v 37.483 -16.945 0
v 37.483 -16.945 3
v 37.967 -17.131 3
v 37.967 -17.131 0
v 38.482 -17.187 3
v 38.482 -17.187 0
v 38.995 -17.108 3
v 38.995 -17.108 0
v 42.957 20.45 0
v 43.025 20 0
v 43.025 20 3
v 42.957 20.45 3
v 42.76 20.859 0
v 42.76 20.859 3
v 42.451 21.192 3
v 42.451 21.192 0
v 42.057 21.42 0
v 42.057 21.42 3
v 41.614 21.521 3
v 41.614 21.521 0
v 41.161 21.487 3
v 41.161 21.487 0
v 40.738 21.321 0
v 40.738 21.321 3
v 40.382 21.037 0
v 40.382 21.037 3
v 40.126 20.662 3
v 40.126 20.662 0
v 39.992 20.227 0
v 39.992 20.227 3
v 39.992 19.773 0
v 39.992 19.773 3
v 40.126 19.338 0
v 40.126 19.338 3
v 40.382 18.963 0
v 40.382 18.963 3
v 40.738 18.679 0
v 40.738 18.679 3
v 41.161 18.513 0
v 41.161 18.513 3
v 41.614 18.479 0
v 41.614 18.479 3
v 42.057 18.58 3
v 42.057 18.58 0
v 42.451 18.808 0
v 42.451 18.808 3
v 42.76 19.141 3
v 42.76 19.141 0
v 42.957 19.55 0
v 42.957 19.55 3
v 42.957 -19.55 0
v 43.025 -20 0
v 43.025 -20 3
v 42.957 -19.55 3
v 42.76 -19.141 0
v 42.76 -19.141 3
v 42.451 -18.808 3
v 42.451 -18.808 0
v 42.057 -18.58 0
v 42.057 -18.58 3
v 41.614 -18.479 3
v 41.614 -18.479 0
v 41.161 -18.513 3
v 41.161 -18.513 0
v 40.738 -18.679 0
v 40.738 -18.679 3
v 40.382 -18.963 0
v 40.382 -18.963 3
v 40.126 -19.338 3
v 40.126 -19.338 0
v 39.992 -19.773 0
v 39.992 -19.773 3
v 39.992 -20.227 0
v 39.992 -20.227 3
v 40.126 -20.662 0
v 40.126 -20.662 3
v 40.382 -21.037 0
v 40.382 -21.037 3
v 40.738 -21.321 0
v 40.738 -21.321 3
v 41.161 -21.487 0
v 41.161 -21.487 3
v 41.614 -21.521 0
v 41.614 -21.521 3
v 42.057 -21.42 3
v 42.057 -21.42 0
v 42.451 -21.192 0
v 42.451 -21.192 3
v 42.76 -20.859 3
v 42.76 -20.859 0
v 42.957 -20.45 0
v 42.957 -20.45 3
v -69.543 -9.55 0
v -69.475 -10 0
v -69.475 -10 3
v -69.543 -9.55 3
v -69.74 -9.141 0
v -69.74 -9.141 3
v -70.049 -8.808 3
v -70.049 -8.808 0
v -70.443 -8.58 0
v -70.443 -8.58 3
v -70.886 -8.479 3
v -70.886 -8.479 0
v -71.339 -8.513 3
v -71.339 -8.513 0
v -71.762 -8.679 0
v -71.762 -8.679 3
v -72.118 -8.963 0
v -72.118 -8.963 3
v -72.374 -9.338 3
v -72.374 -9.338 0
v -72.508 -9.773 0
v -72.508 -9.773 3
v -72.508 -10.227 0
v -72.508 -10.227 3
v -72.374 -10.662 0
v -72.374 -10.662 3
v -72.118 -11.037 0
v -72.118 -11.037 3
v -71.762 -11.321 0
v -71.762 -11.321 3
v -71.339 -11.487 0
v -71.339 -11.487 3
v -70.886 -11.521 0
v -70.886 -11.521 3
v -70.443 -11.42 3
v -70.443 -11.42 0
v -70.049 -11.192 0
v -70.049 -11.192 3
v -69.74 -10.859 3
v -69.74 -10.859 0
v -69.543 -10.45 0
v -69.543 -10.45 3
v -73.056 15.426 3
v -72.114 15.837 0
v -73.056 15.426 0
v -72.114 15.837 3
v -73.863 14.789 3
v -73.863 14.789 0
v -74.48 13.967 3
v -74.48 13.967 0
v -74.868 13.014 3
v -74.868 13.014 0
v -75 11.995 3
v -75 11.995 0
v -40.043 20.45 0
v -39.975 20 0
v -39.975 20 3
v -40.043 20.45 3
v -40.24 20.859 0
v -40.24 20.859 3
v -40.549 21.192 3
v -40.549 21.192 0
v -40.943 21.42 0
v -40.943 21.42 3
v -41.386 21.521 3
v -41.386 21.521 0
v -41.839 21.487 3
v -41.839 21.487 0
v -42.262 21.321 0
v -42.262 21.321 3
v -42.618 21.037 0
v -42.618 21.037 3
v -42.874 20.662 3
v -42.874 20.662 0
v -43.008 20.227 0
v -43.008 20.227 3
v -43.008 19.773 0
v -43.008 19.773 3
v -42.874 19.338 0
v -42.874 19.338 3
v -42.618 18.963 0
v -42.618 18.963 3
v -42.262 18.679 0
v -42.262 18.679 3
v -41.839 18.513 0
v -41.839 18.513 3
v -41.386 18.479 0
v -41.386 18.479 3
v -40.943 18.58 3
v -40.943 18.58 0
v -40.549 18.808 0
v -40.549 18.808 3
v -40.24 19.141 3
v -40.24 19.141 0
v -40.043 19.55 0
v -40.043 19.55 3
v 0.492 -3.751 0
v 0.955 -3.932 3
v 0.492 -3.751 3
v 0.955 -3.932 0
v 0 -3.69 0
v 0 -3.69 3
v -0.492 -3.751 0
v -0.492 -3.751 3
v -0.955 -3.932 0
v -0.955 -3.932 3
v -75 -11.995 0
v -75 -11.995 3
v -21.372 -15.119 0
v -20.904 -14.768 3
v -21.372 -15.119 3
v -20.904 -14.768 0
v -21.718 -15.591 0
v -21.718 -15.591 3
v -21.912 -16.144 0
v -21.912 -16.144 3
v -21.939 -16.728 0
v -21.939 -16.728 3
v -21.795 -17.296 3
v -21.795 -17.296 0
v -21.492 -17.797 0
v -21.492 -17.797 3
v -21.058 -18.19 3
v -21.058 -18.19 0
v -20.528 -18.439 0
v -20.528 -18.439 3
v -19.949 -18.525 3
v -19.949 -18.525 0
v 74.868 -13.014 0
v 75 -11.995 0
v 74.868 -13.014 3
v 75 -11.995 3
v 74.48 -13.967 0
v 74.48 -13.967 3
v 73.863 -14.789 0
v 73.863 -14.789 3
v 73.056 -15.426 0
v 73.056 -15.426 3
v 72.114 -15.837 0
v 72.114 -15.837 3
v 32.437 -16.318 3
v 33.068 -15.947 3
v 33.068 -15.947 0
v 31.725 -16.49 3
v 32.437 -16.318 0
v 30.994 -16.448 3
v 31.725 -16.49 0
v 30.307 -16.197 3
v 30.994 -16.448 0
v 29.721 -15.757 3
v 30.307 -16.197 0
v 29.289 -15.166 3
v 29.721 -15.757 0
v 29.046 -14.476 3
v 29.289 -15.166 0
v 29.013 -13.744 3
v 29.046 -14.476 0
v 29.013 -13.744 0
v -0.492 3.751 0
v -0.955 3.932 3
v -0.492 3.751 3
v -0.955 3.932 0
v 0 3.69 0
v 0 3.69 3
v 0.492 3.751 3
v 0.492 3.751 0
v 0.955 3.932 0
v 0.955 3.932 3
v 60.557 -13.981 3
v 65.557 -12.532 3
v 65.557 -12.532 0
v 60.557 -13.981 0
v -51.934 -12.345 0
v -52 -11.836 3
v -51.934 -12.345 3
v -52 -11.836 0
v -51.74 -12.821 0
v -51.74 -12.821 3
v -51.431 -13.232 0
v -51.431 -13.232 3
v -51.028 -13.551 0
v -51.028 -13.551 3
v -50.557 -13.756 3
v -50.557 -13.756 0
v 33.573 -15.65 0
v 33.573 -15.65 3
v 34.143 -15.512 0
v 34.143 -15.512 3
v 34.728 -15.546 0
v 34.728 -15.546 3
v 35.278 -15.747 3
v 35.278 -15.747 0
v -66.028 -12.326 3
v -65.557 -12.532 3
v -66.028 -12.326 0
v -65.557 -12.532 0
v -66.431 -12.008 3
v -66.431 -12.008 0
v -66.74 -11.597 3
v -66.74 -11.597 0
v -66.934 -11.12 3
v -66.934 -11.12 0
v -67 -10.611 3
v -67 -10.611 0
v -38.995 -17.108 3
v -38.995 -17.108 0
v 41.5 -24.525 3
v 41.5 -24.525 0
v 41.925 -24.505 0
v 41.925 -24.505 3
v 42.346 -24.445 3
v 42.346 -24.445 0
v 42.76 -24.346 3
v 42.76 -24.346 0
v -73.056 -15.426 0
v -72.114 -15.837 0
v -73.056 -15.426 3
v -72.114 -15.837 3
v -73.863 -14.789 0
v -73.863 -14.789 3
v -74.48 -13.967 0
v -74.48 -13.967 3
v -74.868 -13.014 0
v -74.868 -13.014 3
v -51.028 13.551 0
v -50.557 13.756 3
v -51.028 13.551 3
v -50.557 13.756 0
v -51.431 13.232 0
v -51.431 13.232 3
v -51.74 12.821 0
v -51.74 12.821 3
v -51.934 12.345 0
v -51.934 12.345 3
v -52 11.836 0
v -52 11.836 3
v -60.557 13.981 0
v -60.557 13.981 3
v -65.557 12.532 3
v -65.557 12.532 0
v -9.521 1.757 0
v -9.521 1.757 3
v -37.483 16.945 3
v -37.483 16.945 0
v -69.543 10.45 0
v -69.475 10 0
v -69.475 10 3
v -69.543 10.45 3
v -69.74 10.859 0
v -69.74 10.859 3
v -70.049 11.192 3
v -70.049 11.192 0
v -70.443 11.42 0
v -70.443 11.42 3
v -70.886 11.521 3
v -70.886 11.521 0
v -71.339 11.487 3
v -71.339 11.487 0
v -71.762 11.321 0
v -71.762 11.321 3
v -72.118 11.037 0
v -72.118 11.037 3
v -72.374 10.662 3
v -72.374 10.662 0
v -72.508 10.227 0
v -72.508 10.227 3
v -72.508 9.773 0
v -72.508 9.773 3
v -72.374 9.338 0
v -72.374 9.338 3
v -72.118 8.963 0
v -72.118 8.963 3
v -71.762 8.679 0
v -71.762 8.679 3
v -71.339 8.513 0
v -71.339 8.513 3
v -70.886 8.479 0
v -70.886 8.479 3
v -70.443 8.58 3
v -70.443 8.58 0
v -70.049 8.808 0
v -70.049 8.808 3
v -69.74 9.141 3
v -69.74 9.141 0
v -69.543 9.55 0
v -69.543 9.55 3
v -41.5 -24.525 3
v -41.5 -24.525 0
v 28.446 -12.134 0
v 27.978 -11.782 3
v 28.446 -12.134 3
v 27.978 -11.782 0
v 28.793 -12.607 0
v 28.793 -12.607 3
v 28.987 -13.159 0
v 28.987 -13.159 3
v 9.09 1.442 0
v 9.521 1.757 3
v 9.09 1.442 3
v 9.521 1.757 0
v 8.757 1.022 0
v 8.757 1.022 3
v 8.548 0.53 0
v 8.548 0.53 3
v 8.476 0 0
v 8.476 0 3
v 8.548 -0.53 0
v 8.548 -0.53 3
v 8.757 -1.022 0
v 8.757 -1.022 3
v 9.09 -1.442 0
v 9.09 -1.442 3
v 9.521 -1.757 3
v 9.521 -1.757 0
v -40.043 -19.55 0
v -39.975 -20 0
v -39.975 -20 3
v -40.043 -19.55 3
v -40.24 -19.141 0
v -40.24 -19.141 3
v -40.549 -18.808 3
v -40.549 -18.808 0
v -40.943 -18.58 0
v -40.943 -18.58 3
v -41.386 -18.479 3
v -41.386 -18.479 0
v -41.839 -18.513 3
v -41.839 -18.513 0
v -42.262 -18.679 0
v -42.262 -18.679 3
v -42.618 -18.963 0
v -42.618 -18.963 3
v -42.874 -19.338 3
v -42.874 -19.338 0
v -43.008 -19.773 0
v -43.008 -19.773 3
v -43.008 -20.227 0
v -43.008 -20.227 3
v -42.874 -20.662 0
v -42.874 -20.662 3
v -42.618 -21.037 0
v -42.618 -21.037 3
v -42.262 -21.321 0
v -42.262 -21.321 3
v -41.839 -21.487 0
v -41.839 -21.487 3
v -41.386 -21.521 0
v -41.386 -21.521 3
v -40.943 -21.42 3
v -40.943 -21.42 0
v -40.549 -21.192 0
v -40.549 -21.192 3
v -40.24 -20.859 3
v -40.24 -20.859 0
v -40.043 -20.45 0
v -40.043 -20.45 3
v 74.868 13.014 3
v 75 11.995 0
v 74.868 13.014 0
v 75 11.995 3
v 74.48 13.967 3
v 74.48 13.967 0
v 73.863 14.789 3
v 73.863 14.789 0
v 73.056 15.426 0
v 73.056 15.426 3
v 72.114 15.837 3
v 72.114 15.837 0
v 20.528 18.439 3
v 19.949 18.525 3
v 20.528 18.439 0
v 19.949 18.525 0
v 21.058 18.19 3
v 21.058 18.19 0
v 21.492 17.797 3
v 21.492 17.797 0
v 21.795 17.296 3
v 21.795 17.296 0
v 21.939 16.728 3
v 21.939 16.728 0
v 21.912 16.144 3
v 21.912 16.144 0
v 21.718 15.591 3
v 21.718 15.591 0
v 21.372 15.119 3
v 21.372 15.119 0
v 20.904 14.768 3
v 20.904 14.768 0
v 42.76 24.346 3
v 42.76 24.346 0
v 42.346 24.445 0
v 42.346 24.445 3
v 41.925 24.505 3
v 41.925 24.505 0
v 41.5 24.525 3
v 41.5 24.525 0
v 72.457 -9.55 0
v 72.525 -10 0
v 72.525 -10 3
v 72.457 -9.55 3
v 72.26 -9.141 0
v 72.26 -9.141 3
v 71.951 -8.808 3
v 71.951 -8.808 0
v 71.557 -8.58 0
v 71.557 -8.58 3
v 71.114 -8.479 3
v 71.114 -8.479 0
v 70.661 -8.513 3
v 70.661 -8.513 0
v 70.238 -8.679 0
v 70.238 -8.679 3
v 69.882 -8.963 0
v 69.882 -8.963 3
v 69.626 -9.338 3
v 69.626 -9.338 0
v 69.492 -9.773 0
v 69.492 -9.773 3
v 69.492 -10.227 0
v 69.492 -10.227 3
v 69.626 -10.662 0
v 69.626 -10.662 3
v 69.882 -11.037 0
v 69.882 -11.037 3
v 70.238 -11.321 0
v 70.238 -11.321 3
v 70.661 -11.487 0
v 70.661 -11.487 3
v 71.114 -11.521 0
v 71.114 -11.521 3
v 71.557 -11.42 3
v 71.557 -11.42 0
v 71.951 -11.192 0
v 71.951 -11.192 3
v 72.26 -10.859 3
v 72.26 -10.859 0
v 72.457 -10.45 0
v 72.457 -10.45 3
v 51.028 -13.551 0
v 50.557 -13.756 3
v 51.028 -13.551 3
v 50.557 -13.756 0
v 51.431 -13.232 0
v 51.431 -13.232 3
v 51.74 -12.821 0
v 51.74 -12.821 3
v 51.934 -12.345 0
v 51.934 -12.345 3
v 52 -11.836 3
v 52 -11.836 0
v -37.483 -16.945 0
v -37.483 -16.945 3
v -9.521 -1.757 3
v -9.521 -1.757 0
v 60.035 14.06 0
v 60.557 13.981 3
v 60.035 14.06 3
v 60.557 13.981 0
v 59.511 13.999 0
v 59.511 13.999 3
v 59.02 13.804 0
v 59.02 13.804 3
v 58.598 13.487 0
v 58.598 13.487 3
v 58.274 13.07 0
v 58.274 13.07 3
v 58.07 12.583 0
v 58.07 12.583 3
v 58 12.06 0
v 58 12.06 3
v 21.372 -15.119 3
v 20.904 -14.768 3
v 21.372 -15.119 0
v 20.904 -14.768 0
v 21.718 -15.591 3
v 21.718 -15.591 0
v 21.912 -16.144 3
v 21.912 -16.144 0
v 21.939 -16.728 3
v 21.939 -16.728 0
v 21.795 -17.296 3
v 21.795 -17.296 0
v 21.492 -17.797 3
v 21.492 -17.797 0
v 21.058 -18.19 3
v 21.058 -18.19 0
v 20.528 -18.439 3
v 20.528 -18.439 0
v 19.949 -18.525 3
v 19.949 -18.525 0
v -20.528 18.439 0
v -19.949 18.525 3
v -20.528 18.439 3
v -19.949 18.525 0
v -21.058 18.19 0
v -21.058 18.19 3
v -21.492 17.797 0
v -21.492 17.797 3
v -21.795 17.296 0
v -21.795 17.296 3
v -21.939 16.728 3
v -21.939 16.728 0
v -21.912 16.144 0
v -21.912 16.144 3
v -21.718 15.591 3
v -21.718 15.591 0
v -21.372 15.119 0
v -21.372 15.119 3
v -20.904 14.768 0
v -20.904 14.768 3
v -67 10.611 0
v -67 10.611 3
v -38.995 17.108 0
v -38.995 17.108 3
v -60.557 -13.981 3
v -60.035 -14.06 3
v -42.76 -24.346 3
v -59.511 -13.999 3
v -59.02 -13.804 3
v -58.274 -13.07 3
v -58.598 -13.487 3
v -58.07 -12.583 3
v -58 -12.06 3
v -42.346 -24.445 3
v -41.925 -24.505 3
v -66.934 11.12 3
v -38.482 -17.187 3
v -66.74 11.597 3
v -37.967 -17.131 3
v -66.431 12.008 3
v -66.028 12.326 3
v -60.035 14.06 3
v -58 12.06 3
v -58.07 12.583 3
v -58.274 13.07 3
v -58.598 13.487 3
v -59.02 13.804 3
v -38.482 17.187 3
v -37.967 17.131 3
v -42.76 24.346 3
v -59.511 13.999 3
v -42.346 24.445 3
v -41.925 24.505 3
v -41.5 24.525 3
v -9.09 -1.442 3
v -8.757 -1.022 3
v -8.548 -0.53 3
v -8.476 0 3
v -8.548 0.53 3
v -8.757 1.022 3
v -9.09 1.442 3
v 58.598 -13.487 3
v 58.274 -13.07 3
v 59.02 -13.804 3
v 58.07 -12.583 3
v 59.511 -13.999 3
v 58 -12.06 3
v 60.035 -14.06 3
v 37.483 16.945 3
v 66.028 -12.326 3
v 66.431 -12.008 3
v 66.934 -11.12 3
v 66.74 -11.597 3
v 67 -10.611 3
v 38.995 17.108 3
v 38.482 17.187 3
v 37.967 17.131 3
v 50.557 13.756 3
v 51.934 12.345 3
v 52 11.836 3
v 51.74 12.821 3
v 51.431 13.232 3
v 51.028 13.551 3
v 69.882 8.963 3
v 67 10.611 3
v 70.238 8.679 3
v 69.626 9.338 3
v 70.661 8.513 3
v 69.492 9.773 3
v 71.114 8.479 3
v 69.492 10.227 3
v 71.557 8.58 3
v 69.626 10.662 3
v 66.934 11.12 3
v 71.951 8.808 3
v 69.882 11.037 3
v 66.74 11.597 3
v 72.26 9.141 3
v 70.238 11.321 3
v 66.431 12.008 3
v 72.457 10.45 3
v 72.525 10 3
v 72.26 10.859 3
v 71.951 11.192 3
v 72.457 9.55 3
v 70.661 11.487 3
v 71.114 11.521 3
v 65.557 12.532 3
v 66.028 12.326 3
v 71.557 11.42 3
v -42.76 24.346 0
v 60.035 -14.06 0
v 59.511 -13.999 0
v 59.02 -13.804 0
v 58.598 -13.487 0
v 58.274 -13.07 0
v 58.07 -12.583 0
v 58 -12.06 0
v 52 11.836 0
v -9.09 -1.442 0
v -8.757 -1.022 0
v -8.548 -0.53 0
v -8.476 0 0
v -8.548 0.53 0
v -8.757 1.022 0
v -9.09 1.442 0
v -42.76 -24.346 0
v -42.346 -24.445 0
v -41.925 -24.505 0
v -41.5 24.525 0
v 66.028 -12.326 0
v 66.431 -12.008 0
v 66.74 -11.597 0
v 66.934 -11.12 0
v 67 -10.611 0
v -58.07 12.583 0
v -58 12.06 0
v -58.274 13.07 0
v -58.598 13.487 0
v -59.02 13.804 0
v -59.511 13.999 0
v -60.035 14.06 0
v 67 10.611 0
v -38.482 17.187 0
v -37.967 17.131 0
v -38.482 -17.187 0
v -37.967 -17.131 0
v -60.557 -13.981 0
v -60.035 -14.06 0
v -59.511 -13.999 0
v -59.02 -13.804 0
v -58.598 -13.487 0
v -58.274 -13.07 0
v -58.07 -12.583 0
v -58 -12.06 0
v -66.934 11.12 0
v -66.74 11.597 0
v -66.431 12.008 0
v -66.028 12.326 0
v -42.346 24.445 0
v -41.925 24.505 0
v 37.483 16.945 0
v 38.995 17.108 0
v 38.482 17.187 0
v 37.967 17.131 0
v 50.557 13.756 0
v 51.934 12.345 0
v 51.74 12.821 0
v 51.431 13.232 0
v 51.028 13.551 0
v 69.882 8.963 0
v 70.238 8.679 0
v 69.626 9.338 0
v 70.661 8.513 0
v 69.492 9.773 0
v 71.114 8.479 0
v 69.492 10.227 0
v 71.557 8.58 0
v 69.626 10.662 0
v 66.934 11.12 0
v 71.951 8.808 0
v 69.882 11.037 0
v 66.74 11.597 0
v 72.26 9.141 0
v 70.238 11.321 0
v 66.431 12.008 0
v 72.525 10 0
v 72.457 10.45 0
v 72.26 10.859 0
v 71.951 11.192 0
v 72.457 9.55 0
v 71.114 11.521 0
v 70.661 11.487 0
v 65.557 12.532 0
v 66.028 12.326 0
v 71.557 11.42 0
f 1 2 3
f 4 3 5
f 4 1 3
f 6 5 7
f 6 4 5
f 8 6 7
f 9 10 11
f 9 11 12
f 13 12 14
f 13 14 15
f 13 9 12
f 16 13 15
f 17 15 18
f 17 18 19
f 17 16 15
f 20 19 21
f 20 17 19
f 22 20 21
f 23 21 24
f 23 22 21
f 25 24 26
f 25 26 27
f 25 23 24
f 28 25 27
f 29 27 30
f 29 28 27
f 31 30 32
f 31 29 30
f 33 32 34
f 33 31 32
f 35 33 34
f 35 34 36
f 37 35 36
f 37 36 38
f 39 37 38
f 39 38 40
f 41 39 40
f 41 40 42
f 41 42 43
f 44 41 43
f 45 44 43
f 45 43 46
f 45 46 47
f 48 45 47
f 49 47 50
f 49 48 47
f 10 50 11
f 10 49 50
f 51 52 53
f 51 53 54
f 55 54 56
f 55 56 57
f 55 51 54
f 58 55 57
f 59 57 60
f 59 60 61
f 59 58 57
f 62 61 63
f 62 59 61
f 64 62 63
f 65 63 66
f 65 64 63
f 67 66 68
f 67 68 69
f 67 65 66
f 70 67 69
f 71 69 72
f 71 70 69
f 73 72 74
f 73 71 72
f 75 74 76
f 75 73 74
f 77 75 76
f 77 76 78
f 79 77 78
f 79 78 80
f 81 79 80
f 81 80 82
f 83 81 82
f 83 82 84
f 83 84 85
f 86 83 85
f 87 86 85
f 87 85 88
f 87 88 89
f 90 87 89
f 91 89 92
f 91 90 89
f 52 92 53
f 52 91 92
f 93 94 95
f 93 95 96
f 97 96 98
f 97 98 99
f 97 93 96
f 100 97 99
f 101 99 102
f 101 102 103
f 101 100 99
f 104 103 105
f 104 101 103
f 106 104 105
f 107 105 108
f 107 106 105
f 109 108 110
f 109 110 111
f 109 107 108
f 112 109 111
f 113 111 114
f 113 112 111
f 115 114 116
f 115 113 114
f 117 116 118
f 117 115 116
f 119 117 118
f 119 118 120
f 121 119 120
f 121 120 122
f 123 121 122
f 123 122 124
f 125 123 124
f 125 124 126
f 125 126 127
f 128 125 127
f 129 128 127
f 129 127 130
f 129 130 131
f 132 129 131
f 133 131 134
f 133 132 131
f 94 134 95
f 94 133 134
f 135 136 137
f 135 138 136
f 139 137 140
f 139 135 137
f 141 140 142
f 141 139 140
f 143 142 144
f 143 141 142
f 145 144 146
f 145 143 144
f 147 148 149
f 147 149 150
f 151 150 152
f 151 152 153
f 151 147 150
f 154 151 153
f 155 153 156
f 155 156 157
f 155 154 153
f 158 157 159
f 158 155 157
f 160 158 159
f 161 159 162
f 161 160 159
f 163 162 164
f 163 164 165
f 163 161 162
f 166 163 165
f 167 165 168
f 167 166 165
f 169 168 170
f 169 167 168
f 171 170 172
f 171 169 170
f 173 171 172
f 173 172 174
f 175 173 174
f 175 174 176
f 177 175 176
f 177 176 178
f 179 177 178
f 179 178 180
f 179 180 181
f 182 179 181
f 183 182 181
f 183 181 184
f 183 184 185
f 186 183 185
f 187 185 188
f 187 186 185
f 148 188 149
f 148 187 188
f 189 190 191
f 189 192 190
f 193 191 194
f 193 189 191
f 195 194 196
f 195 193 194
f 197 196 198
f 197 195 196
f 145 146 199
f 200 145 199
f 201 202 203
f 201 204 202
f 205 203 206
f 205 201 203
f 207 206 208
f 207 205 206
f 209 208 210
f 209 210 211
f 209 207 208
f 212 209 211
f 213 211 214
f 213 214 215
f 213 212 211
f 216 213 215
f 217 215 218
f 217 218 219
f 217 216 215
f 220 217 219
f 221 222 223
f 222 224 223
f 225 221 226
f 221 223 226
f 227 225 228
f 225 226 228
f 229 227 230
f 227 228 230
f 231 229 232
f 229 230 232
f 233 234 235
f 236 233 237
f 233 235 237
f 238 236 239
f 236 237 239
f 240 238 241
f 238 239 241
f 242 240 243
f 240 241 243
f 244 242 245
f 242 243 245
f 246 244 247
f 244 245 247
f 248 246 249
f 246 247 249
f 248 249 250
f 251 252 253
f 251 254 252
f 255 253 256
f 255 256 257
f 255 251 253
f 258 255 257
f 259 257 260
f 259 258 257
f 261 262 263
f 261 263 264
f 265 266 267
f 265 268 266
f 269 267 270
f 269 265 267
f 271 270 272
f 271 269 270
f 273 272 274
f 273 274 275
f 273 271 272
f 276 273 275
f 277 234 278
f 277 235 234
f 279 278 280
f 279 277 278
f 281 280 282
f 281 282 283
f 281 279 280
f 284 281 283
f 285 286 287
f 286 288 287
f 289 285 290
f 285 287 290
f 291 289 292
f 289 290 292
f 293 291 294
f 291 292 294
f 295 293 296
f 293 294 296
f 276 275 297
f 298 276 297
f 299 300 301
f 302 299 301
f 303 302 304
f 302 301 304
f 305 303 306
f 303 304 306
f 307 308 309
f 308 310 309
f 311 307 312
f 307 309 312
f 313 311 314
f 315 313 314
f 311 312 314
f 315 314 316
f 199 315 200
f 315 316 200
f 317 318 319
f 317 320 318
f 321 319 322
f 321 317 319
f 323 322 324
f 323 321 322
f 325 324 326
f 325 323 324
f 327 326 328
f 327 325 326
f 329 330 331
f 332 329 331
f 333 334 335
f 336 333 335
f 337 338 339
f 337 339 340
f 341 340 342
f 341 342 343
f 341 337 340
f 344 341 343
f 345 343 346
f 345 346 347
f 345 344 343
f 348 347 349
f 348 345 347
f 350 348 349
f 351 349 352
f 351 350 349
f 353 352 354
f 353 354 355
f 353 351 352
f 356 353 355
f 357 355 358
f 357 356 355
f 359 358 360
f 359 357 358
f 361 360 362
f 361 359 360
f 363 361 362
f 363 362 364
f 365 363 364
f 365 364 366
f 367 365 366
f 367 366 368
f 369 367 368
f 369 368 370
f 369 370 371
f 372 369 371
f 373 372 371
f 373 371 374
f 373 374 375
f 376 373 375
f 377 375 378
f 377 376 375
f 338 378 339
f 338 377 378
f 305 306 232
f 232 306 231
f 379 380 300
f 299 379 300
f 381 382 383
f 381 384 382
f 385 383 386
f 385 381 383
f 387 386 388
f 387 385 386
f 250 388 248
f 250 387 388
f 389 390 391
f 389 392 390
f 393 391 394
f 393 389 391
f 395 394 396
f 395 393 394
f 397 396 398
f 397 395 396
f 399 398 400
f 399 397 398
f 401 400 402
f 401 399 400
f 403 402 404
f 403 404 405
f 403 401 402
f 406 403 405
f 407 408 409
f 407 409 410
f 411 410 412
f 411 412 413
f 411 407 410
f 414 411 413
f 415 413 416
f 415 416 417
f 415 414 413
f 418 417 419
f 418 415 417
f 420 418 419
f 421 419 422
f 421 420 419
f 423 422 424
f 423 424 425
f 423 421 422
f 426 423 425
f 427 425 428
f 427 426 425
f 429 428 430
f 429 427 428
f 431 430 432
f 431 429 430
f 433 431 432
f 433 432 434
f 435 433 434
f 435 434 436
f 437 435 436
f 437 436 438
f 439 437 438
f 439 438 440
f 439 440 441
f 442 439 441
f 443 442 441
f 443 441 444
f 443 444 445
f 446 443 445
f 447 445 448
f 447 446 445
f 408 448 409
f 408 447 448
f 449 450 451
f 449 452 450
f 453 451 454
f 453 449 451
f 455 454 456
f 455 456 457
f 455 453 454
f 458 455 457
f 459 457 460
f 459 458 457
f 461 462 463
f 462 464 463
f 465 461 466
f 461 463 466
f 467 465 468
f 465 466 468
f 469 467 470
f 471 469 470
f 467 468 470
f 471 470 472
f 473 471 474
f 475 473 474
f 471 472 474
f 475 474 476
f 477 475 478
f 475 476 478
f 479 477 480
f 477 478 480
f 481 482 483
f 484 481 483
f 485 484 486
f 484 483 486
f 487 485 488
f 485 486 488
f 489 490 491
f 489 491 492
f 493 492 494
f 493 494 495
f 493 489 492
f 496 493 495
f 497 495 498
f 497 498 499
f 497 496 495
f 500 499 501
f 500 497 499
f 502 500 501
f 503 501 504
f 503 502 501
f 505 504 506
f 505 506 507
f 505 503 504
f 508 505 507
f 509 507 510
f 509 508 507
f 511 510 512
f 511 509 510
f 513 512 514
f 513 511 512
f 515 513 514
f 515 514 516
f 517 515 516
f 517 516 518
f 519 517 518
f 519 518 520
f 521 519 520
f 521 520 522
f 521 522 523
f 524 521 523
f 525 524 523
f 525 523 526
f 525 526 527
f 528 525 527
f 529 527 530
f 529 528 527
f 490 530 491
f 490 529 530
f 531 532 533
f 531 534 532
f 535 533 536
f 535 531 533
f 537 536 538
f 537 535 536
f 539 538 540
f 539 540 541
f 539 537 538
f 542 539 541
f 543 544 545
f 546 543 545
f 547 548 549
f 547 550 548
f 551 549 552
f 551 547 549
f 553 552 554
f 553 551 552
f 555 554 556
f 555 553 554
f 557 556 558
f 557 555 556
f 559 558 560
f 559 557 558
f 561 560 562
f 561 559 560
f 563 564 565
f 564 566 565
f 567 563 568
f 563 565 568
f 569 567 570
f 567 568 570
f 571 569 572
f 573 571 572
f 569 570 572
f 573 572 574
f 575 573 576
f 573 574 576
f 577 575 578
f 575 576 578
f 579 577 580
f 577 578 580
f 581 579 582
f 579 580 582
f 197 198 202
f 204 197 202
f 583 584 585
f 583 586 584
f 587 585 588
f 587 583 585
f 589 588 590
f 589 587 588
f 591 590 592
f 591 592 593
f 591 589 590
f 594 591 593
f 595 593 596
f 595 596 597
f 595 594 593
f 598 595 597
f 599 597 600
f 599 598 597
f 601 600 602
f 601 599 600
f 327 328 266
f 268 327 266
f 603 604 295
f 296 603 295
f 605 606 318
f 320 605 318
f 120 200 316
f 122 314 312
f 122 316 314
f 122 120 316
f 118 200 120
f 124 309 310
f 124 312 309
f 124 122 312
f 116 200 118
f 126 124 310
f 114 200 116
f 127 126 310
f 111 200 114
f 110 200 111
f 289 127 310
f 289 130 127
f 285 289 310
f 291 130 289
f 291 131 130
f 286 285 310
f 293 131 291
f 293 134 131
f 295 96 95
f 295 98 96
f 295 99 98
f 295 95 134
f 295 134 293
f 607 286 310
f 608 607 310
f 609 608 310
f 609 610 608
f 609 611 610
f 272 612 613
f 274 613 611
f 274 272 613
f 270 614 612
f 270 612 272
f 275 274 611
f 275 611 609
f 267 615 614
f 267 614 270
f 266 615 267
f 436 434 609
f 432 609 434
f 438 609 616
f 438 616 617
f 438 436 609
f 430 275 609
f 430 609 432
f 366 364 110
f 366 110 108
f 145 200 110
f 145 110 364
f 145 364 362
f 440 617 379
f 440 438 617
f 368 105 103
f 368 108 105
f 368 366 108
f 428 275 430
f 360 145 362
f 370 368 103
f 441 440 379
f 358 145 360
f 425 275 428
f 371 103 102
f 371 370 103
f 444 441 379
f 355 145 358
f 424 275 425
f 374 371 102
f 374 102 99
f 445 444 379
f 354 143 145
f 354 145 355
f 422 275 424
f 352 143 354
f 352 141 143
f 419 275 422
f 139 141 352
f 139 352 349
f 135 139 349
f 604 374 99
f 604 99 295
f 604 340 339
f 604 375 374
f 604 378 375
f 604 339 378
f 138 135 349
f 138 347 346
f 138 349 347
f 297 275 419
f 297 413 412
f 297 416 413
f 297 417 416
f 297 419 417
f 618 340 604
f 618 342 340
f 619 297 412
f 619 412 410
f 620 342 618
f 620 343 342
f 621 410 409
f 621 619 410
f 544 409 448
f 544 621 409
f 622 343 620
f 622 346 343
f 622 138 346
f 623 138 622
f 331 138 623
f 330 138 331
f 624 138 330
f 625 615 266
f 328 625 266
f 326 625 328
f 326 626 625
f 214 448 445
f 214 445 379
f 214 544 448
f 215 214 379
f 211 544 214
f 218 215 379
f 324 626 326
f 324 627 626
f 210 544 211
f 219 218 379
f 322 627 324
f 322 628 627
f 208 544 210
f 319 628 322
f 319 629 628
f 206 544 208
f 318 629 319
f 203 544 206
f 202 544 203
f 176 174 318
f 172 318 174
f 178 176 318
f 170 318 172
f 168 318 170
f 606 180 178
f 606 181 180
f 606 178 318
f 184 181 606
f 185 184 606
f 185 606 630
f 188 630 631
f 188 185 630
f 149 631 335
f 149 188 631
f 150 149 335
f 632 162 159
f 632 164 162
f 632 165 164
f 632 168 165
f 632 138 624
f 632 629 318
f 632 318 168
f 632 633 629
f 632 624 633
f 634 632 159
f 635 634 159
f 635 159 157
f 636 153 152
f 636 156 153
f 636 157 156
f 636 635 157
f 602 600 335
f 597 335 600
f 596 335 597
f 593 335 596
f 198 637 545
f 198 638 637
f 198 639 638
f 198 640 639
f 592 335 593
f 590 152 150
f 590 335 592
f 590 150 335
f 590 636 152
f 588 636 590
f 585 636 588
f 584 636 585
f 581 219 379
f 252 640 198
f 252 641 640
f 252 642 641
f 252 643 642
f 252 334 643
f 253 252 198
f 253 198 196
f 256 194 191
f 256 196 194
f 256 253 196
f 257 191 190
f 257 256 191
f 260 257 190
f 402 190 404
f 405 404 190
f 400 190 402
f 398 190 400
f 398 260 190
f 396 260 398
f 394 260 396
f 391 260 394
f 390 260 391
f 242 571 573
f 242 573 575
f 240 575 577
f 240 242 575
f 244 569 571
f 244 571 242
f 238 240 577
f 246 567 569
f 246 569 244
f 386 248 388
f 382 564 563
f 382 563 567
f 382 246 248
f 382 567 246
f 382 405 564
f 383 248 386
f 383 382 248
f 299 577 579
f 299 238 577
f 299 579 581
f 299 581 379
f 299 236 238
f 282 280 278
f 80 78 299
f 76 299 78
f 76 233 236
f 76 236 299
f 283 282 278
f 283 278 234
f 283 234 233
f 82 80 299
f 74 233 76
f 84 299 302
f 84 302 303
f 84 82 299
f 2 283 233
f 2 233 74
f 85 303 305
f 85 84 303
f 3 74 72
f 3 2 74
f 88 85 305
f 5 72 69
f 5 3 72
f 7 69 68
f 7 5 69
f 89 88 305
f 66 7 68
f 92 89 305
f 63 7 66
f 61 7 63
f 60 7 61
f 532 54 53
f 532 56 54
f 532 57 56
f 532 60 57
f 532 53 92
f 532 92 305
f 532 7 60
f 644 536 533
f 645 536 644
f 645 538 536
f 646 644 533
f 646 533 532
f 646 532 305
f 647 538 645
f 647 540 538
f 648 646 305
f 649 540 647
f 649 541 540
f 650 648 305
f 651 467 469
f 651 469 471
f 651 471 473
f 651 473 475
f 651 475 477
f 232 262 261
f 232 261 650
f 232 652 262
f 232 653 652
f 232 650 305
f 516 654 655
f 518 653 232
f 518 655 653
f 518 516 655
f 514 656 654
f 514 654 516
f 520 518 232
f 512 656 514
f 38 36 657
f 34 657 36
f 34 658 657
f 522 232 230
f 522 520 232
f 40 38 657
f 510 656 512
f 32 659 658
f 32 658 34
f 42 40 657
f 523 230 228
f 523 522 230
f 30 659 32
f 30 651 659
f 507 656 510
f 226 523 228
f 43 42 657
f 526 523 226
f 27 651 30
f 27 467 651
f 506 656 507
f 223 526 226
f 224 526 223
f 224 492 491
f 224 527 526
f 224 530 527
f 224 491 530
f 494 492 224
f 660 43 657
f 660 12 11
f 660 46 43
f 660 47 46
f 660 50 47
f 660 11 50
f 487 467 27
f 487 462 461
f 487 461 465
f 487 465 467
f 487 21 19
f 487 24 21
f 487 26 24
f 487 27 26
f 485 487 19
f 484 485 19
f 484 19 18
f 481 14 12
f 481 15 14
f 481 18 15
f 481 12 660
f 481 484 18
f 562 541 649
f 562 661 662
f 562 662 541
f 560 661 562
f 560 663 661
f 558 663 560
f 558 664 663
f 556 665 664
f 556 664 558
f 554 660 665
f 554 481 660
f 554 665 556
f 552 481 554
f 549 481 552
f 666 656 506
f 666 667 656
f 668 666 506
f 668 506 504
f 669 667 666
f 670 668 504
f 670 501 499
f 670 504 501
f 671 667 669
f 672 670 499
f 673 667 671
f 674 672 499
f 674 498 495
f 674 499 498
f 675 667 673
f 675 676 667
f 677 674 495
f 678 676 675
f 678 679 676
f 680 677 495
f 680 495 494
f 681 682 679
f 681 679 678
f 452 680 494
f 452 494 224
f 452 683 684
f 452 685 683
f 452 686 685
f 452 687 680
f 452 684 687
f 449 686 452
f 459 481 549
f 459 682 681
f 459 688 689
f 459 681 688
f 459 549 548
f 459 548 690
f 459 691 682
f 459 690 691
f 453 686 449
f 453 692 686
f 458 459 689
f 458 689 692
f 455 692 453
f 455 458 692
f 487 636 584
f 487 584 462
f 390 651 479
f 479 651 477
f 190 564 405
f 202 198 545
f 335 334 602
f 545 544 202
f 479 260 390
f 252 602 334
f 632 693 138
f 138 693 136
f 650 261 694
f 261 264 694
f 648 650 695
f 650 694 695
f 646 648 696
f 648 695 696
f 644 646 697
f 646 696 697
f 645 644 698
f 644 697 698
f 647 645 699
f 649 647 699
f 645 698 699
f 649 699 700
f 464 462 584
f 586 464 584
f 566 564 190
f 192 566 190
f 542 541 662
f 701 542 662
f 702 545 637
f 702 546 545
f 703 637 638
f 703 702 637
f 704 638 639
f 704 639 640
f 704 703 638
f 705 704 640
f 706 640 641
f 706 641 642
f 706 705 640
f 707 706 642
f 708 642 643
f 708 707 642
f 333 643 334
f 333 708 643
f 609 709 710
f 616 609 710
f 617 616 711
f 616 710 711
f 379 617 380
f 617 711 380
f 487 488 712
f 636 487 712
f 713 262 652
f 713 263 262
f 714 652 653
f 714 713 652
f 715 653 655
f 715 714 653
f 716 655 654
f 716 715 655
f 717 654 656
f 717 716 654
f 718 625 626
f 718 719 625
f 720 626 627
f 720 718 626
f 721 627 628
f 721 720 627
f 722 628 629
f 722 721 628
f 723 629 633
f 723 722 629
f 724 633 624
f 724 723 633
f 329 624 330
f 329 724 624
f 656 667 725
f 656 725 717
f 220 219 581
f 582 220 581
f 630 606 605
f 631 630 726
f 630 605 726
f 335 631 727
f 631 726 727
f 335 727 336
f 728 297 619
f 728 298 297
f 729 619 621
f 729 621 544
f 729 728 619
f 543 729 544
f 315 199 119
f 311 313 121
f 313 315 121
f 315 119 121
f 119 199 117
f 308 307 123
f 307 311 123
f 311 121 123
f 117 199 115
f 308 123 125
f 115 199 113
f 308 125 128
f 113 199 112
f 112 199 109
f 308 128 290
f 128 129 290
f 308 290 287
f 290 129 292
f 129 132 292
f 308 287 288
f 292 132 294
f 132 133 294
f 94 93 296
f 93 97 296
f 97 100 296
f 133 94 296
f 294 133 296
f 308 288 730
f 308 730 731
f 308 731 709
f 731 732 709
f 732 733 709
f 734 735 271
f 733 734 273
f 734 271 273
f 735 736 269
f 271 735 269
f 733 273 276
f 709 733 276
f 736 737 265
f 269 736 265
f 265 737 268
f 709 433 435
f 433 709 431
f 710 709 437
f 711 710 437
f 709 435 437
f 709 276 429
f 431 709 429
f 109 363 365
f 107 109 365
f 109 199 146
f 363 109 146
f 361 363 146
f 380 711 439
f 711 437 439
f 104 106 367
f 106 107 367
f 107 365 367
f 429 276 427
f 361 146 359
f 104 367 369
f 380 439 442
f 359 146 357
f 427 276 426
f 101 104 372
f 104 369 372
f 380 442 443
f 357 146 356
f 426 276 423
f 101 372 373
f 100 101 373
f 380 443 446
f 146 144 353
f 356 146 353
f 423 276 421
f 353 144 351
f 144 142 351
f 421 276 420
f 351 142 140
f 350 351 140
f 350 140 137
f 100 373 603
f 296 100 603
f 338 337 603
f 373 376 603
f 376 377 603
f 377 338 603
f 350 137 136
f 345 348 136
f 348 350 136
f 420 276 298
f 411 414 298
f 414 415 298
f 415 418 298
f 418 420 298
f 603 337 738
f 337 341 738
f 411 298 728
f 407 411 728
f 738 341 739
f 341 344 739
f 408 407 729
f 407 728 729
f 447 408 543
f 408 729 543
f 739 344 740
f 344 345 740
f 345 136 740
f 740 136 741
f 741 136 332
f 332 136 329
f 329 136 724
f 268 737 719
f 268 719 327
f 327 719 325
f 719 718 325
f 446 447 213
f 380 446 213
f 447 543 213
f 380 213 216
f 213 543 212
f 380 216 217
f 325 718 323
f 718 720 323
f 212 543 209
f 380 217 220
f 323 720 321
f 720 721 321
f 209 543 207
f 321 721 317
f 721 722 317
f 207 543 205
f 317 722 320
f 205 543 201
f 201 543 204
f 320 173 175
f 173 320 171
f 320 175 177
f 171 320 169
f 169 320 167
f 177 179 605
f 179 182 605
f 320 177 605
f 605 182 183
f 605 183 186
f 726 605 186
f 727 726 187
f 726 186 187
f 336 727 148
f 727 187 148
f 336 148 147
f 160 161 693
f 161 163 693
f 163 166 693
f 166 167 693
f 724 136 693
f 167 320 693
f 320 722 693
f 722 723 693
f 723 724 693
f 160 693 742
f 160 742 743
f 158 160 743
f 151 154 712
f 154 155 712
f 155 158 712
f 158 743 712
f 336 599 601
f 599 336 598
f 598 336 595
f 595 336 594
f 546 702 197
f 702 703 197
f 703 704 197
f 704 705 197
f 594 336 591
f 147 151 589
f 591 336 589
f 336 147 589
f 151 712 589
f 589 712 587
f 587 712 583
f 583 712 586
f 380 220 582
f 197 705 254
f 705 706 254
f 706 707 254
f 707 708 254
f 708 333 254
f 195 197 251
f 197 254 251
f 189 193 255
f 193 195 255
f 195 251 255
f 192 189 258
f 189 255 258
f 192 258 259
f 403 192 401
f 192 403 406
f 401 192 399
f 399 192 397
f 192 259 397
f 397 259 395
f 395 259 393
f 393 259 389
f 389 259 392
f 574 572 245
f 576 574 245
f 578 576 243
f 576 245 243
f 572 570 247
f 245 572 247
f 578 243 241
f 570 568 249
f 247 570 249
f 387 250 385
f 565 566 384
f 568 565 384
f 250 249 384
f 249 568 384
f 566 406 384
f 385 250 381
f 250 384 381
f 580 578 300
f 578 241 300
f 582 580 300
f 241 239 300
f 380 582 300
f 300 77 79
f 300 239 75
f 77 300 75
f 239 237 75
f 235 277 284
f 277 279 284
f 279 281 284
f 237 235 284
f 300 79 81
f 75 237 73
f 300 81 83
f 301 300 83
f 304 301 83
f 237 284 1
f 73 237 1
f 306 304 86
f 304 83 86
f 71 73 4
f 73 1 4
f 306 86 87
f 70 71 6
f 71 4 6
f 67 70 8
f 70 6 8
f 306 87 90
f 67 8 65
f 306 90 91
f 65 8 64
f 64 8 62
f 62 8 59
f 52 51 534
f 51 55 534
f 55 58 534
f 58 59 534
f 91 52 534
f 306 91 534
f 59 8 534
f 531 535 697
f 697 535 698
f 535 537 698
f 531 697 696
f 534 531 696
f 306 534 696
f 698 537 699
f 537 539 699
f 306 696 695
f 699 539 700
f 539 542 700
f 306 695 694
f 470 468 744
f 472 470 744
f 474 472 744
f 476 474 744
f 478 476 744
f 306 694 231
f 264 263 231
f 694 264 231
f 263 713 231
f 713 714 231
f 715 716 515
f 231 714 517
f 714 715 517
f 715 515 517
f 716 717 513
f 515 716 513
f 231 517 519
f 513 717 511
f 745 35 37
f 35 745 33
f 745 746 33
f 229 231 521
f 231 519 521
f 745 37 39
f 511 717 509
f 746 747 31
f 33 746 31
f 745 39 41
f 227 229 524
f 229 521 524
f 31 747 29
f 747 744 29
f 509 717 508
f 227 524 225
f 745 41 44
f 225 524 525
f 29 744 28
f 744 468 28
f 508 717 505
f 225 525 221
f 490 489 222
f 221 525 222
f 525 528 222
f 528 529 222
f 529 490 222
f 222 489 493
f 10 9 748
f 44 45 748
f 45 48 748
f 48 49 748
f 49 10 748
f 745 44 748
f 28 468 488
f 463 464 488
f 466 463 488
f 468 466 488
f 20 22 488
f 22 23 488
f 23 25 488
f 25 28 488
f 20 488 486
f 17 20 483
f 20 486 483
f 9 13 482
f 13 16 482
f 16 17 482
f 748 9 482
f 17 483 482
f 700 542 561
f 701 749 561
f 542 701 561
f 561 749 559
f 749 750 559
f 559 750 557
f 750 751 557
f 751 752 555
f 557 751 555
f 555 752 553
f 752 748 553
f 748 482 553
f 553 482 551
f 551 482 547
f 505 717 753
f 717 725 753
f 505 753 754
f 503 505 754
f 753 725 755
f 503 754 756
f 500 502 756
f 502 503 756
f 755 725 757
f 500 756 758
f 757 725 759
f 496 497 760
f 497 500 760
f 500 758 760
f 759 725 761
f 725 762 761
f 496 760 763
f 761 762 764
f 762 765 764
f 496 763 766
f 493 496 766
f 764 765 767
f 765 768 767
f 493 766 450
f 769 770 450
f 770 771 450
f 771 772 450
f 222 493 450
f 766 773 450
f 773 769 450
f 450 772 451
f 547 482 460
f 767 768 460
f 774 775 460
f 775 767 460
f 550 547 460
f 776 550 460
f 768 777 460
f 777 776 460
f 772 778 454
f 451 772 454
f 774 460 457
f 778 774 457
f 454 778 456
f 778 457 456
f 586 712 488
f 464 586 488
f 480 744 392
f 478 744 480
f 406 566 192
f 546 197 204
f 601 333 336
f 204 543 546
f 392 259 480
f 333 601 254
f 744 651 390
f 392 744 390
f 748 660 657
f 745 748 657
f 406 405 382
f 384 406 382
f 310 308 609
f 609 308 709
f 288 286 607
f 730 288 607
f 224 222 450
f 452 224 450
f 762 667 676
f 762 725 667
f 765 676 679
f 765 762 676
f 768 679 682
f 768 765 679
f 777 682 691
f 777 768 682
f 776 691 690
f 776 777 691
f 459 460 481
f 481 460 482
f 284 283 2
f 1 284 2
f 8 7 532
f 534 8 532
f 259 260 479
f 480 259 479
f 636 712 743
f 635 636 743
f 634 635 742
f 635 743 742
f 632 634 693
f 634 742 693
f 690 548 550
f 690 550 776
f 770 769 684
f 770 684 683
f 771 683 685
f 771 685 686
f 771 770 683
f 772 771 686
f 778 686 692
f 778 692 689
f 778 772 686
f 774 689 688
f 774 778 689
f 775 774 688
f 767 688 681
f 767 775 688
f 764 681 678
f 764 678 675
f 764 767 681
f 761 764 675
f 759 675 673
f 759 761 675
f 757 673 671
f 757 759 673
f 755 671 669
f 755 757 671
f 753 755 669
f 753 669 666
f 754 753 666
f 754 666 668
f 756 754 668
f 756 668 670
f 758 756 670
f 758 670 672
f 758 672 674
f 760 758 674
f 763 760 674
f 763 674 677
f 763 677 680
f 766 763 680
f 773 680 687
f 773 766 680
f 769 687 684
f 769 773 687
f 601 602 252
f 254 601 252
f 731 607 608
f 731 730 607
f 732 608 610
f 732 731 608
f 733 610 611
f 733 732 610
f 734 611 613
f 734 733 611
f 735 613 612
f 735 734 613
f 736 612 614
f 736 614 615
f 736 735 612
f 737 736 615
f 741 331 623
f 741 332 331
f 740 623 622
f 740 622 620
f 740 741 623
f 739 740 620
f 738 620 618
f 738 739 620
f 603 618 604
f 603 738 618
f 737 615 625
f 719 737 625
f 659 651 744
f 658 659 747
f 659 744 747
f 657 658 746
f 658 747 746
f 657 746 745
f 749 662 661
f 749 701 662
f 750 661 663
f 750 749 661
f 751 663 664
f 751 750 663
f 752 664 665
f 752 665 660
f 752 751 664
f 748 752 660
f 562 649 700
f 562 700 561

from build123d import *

# Parameters (mm, degrees)
SKETCH_1_R          = 1.525
EXTRUDE_1_DEPTH     = 3
FILLET_1_R          = 4
CUT_EXTRUDE_1_DEPTH = 10
FILLET_2_R          = 2
SKETCH_4_R          = 2.5
CUT_EXTRUDE_2_DEPTH = 10
FILLET_3_R          = 2


with BuildPart() as part:
    # 草图1 → 凸台-拉伸1 (new body)
    with BuildSketch(Plane.XY):
        with BuildLine():
            Line((75, -15), (75, 15))
            Line((75, 15), (42.759879905, 24.346070366))
            ThreePointArc((42.759879905, 24.346070366), (42.136261187, 24.480044275), (41.5, 24.525))
            Line((41.5, 24.525), (-41.5, 24.525))
            ThreePointArc((-41.5, 24.525), (-42.136261187, 24.480044275), (-42.759879905, 24.346070366))
            Line((-42.759879905, 24.346070366), (-75, 15))
            Line((-75, 15), (-75, -15))
            Line((-75, -15), (-42.759879905, -24.346070366))
            ThreePointArc((-42.759879905, -24.346070366), (-42.136261187, -24.480044275), (-41.5, -24.525))
            Line((-41.5, -24.525), (41.5, -24.525))
            ThreePointArc((41.5, -24.525), (42.136261187, -24.480044275), (42.759879905, -24.346070366))
            Line((42.759879905, -24.346070366), (75, -15))
        make_face()
        with Locations((-71, -10)):
            Circle(SKETCH_1_R, mode=Mode.SUBTRACT)
        with Locations((71, -10)):
            Circle(SKETCH_1_R, mode=Mode.SUBTRACT)
        with Locations((-71, 10)):
            Circle(SKETCH_1_R, mode=Mode.SUBTRACT)
        with Locations((71, 10)):
            Circle(SKETCH_1_R, mode=Mode.SUBTRACT)
        with Locations((-41.5, 20)):
            Circle(SKETCH_1_R, mode=Mode.SUBTRACT)
        with Locations((-41.5, -20)):
            Circle(SKETCH_1_R, mode=Mode.SUBTRACT)
        with Locations((41.5, 20)):
            Circle(SKETCH_1_R, mode=Mode.SUBTRACT)
        with Locations((41.5, -20)):
            Circle(SKETCH_1_R, mode=Mode.SUBTRACT)
    extrude(amount=EXTRUDE_1_DEPTH)

    # 圆角1
    fillet_1_edges = [part.edges().sort_by_distance(p)[0] for p in [
        (75, 15, 1.5),
        (75, -15, 1.5),
        (-75, -15, 1.5),
        (-75, 15, 1.5),
    ]]
    fillet(fillet_1_edges, radius=FILLET_1_R)

    # 草图2 → 切除-拉伸1 (cut)
    with BuildSketch(Plane.XY.offset(3)):
        Polygon((27.82171702, 18.525), (-27.82171702, 18.525), (0, 3.413941893), align=None)
        Polygon((-38.205524372, 17.336966413), (-52, 13.338093595), (-52, -13.338093595), (-38.205524372, -17.336966413), (-6.285577396, 0), align=None)
        Polygon((27.82171702, -18.525), (0, -3.413941893), (-27.82171702, -18.525), align=None)
        Polygon((38.205524372, 17.336966413), (6.285577396, 0), (38.205524372, -17.336966413), (52, -13.338093595), (52, 13.338093595), align=None)
        Polygon((58, -14.722268277), (58, 14.722268277), (67, 12.113263316), (67, -12.113263316), align=None)
        Polygon((-67, -12.113263316), (-58, -14.722268277), (-58, 14.722268277), (-67, 12.113263316), align=None)
    extrude(amount=-CUT_EXTRUDE_1_DEPTH, mode=Mode.SUBTRACT)

    # 圆角2
    fillet_2_edges = [part.edges().sort_by_distance(p)[0] for p in [
        (-58, -14.722268277, 1.5),
        (-67, -12.113263316, 1.5),
        (-67, 12.113263316, 1.5),
        (-58, 14.722268277, 1.5),
        (0, -3.413941893, 1.5),
        (27.82171702, -18.525, 1.5),
        (-27.82171702, -18.525, 1.5),
        (-6.285577396, 0, 1.5),
        (-38.205524372, -17.336966413, 1.5),
        (-52, -13.338093595, 1.5),
        (-52, 13.338093595, 1.5),
        (-38.205524372, 17.336966413, 1.5),
        (38.205524372, 17.336966413, 1.5),
        (52, 13.338093595, 1.5),
        (52, -13.338093595, 1.5),
        (38.205524372, -17.336966413, 1.5),
        (6.285577396, 0, 1.5),
        (58, -14.722268277, 1.5),
        (58, 14.722268277, 1.5),
        (67, 12.113263316, 1.5),
        (67, -12.113263316, 1.5),
        (-27.82171702, 18.525, 1.5),
        (27.82171702, 18.525, 1.5),
        (0, 3.413941893, 1.5),
    ]]
    fillet(fillet_2_edges, radius=FILLET_2_R)

    # 草图4 → 切除-拉伸2 (cut)
    with BuildSketch(Plane(origin=(0, 0, 0), x_dir=(-1, 0, 0), z_dir=(0, 0, -1))):
        with Locations((-31.5, -14)):
            Circle(SKETCH_4_R)
    extrude(amount=-CUT_EXTRUDE_2_DEPTH, mode=Mode.SUBTRACT)

    # 圆角3
    fillet_3_edges = [part.edges().sort_by_distance(p)[0] for p in [
        (33.812155271, -14.950756542, 1.5),
        (29.443740814, -12.57810051, 1.5),
    ]]
    fillet(fillet_3_edges, radius=FILLET_3_R)


solid = part.part
